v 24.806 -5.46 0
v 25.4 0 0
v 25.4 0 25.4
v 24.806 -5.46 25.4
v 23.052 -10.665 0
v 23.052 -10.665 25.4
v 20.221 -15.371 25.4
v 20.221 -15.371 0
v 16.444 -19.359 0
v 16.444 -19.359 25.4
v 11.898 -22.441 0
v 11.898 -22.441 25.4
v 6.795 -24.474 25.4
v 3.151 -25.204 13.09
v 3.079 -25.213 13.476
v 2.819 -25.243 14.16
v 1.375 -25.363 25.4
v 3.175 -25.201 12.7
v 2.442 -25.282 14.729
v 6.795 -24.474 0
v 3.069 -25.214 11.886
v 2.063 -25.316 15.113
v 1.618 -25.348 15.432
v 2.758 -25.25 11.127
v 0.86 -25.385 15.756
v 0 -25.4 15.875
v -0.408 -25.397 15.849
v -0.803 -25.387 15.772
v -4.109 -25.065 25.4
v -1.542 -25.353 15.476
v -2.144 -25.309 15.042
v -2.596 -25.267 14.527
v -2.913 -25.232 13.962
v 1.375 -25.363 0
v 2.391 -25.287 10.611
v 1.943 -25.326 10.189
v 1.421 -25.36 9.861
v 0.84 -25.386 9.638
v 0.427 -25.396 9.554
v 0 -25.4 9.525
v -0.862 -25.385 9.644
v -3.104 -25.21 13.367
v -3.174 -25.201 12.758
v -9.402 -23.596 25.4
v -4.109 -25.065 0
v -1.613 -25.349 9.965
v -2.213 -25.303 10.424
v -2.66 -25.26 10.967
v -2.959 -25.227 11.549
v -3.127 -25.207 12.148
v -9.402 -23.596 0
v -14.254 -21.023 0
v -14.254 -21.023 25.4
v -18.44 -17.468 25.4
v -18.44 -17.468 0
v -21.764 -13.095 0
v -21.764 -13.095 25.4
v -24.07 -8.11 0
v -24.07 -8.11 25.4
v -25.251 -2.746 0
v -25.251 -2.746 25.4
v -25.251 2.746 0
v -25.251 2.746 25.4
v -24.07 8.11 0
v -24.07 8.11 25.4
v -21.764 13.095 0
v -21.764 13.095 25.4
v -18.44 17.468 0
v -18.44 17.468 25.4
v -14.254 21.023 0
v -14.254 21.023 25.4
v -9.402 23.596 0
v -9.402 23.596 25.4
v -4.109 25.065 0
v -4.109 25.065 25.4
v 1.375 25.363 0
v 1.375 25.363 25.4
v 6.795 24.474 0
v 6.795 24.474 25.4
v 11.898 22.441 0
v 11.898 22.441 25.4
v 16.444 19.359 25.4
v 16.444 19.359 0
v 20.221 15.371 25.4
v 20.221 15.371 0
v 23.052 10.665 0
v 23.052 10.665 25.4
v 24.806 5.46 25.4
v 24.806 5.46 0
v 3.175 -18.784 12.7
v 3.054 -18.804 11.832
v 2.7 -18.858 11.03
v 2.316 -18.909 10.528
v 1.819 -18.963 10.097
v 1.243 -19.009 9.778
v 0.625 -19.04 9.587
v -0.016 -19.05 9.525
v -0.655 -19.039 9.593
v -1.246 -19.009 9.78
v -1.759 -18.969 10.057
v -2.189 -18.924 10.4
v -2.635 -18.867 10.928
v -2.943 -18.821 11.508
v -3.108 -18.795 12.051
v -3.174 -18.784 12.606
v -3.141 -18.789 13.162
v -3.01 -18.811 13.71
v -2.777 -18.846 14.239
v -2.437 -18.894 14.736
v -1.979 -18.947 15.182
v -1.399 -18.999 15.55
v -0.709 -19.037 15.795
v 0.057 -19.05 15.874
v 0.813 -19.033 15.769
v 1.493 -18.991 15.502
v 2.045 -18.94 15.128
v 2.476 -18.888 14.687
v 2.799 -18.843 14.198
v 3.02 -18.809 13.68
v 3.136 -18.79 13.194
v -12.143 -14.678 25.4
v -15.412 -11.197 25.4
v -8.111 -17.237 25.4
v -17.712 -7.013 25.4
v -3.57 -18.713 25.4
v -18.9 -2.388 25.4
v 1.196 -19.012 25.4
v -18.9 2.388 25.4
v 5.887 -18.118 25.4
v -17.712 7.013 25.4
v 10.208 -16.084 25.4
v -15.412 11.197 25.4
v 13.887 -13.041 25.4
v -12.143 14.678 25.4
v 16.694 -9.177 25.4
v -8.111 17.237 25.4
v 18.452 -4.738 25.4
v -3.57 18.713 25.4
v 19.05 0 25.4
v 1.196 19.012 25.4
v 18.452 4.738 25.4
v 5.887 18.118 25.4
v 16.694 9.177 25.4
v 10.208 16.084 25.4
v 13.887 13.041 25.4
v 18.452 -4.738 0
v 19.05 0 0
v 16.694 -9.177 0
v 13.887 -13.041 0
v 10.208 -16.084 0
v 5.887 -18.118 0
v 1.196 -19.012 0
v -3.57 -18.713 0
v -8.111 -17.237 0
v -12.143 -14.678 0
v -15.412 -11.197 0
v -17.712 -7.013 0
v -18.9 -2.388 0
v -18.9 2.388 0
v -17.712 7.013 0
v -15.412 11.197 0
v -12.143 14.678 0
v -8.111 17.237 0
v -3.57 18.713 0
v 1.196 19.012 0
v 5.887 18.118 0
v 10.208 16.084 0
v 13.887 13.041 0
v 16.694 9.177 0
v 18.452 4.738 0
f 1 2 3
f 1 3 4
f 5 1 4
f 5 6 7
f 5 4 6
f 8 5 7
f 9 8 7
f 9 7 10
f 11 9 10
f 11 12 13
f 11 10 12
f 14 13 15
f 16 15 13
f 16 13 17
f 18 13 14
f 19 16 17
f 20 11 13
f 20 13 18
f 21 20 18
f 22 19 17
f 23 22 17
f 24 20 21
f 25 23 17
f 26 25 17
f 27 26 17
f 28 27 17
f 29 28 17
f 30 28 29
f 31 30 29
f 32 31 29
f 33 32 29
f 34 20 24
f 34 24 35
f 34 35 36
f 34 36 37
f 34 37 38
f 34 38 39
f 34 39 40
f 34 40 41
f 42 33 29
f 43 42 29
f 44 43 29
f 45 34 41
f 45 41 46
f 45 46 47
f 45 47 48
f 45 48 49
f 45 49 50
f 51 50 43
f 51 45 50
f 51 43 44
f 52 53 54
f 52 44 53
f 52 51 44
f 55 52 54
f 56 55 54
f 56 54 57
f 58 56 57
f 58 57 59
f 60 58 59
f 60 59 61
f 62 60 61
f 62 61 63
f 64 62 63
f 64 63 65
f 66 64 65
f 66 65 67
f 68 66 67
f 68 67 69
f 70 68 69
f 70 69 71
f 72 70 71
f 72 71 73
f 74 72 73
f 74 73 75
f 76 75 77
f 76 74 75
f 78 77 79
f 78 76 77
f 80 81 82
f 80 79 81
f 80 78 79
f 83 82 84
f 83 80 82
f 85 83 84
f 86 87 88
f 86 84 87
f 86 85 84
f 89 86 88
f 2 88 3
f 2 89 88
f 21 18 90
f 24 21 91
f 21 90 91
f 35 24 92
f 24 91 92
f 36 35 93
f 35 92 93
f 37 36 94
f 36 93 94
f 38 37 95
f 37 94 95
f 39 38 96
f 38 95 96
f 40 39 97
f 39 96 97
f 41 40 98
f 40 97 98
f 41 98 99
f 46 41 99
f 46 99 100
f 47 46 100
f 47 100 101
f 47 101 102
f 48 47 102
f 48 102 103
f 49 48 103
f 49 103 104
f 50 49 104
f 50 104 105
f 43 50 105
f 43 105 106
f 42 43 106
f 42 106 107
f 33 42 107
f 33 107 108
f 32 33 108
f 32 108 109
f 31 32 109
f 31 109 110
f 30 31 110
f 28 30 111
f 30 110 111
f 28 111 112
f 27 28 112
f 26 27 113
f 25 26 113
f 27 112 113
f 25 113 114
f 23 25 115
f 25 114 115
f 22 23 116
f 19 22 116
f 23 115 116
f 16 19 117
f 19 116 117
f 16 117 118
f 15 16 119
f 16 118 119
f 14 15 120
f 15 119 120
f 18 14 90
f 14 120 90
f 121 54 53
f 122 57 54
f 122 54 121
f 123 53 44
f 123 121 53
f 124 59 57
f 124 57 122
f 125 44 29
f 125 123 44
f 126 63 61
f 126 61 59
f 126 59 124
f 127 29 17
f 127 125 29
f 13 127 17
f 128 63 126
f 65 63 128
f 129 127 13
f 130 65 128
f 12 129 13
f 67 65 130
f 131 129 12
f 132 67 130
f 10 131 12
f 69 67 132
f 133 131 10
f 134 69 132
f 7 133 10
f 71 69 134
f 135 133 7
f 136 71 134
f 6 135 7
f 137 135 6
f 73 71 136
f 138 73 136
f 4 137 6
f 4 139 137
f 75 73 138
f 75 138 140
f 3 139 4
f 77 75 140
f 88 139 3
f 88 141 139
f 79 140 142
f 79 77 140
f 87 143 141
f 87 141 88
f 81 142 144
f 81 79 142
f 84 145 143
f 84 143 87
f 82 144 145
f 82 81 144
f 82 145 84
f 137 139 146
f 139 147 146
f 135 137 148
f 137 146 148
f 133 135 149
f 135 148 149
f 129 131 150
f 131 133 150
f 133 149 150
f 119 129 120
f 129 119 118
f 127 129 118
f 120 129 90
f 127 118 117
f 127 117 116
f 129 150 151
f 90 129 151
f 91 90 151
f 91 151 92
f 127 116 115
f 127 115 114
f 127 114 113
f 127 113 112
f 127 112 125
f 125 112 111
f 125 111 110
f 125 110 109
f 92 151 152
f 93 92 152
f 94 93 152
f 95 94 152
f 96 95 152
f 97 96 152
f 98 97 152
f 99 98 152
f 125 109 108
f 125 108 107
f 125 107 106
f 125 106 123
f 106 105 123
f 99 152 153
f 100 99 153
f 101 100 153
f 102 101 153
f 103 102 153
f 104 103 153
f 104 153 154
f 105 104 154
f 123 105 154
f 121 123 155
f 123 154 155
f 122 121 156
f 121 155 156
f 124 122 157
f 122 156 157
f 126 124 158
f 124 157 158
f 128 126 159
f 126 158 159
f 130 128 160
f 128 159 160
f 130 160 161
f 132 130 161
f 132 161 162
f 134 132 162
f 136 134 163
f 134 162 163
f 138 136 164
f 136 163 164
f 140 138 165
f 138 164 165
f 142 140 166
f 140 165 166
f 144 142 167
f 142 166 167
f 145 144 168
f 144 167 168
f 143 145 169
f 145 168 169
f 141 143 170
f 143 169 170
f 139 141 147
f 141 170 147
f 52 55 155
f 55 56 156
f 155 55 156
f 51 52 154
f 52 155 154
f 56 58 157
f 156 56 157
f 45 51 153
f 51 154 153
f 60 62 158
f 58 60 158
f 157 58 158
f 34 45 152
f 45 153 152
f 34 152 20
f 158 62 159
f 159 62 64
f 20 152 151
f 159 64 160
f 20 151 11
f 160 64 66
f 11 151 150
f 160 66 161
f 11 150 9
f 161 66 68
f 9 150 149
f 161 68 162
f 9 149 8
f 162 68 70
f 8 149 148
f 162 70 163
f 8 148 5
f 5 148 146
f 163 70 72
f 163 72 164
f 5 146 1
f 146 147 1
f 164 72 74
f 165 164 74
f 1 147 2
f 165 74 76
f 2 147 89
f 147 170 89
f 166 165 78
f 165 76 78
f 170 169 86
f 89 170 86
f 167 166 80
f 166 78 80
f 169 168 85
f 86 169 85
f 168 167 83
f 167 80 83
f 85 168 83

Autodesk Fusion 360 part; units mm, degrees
sketch "Sketch1" plane through (0, 0, 0) normal (0, 0, 1) x (1, 0, 0)
  circle A0 centre (0, 0) radius 25.4
  circle A1 centre (0, 0) radius 19.05
  circle A2 centre (0, 0) radius 22.225 construction
  line L0 (0, 0) -> (0, 25.4) construction
  point P0 (0, 22.225)
  dimension "d1" = 50.8
  dimension "d2" = 38.1
  dimension "d5" = 44.45
extrude "Extrude1" add sketch "Sketch1" along normal blind 25.4
hole "Hole1" at (0, 0, 0) direction (0, 0, -1) diameter 3.4163 depth 25.4 tip angle 118
pattern_circular "C-Pattern1" count 3 over 360 about axis through (0, 0, 0) along (0, 0, 1) of "Hole1"
sketch "Sketch3" plane through (0, 0, 0) normal (0, 1, 0) x (1, 0, 0)
  line L0 (-25.4, -25.4) -> (25.4, -25.4)
  line L1 (-25.4, 0) -> (25.4, 0)
  line L2 (0, 0) -> (0, -12.7) construction
  line L3 (0, -12.7) -> (0, -25.4) construction
  circle A0 centre (0, -12.7) radius 3.175
  point P0 (0, -12.7)
  dimension "d12" = 6.35
extrude "Extrude2" cut sketch "Sketch3" against normal blind 25.4
